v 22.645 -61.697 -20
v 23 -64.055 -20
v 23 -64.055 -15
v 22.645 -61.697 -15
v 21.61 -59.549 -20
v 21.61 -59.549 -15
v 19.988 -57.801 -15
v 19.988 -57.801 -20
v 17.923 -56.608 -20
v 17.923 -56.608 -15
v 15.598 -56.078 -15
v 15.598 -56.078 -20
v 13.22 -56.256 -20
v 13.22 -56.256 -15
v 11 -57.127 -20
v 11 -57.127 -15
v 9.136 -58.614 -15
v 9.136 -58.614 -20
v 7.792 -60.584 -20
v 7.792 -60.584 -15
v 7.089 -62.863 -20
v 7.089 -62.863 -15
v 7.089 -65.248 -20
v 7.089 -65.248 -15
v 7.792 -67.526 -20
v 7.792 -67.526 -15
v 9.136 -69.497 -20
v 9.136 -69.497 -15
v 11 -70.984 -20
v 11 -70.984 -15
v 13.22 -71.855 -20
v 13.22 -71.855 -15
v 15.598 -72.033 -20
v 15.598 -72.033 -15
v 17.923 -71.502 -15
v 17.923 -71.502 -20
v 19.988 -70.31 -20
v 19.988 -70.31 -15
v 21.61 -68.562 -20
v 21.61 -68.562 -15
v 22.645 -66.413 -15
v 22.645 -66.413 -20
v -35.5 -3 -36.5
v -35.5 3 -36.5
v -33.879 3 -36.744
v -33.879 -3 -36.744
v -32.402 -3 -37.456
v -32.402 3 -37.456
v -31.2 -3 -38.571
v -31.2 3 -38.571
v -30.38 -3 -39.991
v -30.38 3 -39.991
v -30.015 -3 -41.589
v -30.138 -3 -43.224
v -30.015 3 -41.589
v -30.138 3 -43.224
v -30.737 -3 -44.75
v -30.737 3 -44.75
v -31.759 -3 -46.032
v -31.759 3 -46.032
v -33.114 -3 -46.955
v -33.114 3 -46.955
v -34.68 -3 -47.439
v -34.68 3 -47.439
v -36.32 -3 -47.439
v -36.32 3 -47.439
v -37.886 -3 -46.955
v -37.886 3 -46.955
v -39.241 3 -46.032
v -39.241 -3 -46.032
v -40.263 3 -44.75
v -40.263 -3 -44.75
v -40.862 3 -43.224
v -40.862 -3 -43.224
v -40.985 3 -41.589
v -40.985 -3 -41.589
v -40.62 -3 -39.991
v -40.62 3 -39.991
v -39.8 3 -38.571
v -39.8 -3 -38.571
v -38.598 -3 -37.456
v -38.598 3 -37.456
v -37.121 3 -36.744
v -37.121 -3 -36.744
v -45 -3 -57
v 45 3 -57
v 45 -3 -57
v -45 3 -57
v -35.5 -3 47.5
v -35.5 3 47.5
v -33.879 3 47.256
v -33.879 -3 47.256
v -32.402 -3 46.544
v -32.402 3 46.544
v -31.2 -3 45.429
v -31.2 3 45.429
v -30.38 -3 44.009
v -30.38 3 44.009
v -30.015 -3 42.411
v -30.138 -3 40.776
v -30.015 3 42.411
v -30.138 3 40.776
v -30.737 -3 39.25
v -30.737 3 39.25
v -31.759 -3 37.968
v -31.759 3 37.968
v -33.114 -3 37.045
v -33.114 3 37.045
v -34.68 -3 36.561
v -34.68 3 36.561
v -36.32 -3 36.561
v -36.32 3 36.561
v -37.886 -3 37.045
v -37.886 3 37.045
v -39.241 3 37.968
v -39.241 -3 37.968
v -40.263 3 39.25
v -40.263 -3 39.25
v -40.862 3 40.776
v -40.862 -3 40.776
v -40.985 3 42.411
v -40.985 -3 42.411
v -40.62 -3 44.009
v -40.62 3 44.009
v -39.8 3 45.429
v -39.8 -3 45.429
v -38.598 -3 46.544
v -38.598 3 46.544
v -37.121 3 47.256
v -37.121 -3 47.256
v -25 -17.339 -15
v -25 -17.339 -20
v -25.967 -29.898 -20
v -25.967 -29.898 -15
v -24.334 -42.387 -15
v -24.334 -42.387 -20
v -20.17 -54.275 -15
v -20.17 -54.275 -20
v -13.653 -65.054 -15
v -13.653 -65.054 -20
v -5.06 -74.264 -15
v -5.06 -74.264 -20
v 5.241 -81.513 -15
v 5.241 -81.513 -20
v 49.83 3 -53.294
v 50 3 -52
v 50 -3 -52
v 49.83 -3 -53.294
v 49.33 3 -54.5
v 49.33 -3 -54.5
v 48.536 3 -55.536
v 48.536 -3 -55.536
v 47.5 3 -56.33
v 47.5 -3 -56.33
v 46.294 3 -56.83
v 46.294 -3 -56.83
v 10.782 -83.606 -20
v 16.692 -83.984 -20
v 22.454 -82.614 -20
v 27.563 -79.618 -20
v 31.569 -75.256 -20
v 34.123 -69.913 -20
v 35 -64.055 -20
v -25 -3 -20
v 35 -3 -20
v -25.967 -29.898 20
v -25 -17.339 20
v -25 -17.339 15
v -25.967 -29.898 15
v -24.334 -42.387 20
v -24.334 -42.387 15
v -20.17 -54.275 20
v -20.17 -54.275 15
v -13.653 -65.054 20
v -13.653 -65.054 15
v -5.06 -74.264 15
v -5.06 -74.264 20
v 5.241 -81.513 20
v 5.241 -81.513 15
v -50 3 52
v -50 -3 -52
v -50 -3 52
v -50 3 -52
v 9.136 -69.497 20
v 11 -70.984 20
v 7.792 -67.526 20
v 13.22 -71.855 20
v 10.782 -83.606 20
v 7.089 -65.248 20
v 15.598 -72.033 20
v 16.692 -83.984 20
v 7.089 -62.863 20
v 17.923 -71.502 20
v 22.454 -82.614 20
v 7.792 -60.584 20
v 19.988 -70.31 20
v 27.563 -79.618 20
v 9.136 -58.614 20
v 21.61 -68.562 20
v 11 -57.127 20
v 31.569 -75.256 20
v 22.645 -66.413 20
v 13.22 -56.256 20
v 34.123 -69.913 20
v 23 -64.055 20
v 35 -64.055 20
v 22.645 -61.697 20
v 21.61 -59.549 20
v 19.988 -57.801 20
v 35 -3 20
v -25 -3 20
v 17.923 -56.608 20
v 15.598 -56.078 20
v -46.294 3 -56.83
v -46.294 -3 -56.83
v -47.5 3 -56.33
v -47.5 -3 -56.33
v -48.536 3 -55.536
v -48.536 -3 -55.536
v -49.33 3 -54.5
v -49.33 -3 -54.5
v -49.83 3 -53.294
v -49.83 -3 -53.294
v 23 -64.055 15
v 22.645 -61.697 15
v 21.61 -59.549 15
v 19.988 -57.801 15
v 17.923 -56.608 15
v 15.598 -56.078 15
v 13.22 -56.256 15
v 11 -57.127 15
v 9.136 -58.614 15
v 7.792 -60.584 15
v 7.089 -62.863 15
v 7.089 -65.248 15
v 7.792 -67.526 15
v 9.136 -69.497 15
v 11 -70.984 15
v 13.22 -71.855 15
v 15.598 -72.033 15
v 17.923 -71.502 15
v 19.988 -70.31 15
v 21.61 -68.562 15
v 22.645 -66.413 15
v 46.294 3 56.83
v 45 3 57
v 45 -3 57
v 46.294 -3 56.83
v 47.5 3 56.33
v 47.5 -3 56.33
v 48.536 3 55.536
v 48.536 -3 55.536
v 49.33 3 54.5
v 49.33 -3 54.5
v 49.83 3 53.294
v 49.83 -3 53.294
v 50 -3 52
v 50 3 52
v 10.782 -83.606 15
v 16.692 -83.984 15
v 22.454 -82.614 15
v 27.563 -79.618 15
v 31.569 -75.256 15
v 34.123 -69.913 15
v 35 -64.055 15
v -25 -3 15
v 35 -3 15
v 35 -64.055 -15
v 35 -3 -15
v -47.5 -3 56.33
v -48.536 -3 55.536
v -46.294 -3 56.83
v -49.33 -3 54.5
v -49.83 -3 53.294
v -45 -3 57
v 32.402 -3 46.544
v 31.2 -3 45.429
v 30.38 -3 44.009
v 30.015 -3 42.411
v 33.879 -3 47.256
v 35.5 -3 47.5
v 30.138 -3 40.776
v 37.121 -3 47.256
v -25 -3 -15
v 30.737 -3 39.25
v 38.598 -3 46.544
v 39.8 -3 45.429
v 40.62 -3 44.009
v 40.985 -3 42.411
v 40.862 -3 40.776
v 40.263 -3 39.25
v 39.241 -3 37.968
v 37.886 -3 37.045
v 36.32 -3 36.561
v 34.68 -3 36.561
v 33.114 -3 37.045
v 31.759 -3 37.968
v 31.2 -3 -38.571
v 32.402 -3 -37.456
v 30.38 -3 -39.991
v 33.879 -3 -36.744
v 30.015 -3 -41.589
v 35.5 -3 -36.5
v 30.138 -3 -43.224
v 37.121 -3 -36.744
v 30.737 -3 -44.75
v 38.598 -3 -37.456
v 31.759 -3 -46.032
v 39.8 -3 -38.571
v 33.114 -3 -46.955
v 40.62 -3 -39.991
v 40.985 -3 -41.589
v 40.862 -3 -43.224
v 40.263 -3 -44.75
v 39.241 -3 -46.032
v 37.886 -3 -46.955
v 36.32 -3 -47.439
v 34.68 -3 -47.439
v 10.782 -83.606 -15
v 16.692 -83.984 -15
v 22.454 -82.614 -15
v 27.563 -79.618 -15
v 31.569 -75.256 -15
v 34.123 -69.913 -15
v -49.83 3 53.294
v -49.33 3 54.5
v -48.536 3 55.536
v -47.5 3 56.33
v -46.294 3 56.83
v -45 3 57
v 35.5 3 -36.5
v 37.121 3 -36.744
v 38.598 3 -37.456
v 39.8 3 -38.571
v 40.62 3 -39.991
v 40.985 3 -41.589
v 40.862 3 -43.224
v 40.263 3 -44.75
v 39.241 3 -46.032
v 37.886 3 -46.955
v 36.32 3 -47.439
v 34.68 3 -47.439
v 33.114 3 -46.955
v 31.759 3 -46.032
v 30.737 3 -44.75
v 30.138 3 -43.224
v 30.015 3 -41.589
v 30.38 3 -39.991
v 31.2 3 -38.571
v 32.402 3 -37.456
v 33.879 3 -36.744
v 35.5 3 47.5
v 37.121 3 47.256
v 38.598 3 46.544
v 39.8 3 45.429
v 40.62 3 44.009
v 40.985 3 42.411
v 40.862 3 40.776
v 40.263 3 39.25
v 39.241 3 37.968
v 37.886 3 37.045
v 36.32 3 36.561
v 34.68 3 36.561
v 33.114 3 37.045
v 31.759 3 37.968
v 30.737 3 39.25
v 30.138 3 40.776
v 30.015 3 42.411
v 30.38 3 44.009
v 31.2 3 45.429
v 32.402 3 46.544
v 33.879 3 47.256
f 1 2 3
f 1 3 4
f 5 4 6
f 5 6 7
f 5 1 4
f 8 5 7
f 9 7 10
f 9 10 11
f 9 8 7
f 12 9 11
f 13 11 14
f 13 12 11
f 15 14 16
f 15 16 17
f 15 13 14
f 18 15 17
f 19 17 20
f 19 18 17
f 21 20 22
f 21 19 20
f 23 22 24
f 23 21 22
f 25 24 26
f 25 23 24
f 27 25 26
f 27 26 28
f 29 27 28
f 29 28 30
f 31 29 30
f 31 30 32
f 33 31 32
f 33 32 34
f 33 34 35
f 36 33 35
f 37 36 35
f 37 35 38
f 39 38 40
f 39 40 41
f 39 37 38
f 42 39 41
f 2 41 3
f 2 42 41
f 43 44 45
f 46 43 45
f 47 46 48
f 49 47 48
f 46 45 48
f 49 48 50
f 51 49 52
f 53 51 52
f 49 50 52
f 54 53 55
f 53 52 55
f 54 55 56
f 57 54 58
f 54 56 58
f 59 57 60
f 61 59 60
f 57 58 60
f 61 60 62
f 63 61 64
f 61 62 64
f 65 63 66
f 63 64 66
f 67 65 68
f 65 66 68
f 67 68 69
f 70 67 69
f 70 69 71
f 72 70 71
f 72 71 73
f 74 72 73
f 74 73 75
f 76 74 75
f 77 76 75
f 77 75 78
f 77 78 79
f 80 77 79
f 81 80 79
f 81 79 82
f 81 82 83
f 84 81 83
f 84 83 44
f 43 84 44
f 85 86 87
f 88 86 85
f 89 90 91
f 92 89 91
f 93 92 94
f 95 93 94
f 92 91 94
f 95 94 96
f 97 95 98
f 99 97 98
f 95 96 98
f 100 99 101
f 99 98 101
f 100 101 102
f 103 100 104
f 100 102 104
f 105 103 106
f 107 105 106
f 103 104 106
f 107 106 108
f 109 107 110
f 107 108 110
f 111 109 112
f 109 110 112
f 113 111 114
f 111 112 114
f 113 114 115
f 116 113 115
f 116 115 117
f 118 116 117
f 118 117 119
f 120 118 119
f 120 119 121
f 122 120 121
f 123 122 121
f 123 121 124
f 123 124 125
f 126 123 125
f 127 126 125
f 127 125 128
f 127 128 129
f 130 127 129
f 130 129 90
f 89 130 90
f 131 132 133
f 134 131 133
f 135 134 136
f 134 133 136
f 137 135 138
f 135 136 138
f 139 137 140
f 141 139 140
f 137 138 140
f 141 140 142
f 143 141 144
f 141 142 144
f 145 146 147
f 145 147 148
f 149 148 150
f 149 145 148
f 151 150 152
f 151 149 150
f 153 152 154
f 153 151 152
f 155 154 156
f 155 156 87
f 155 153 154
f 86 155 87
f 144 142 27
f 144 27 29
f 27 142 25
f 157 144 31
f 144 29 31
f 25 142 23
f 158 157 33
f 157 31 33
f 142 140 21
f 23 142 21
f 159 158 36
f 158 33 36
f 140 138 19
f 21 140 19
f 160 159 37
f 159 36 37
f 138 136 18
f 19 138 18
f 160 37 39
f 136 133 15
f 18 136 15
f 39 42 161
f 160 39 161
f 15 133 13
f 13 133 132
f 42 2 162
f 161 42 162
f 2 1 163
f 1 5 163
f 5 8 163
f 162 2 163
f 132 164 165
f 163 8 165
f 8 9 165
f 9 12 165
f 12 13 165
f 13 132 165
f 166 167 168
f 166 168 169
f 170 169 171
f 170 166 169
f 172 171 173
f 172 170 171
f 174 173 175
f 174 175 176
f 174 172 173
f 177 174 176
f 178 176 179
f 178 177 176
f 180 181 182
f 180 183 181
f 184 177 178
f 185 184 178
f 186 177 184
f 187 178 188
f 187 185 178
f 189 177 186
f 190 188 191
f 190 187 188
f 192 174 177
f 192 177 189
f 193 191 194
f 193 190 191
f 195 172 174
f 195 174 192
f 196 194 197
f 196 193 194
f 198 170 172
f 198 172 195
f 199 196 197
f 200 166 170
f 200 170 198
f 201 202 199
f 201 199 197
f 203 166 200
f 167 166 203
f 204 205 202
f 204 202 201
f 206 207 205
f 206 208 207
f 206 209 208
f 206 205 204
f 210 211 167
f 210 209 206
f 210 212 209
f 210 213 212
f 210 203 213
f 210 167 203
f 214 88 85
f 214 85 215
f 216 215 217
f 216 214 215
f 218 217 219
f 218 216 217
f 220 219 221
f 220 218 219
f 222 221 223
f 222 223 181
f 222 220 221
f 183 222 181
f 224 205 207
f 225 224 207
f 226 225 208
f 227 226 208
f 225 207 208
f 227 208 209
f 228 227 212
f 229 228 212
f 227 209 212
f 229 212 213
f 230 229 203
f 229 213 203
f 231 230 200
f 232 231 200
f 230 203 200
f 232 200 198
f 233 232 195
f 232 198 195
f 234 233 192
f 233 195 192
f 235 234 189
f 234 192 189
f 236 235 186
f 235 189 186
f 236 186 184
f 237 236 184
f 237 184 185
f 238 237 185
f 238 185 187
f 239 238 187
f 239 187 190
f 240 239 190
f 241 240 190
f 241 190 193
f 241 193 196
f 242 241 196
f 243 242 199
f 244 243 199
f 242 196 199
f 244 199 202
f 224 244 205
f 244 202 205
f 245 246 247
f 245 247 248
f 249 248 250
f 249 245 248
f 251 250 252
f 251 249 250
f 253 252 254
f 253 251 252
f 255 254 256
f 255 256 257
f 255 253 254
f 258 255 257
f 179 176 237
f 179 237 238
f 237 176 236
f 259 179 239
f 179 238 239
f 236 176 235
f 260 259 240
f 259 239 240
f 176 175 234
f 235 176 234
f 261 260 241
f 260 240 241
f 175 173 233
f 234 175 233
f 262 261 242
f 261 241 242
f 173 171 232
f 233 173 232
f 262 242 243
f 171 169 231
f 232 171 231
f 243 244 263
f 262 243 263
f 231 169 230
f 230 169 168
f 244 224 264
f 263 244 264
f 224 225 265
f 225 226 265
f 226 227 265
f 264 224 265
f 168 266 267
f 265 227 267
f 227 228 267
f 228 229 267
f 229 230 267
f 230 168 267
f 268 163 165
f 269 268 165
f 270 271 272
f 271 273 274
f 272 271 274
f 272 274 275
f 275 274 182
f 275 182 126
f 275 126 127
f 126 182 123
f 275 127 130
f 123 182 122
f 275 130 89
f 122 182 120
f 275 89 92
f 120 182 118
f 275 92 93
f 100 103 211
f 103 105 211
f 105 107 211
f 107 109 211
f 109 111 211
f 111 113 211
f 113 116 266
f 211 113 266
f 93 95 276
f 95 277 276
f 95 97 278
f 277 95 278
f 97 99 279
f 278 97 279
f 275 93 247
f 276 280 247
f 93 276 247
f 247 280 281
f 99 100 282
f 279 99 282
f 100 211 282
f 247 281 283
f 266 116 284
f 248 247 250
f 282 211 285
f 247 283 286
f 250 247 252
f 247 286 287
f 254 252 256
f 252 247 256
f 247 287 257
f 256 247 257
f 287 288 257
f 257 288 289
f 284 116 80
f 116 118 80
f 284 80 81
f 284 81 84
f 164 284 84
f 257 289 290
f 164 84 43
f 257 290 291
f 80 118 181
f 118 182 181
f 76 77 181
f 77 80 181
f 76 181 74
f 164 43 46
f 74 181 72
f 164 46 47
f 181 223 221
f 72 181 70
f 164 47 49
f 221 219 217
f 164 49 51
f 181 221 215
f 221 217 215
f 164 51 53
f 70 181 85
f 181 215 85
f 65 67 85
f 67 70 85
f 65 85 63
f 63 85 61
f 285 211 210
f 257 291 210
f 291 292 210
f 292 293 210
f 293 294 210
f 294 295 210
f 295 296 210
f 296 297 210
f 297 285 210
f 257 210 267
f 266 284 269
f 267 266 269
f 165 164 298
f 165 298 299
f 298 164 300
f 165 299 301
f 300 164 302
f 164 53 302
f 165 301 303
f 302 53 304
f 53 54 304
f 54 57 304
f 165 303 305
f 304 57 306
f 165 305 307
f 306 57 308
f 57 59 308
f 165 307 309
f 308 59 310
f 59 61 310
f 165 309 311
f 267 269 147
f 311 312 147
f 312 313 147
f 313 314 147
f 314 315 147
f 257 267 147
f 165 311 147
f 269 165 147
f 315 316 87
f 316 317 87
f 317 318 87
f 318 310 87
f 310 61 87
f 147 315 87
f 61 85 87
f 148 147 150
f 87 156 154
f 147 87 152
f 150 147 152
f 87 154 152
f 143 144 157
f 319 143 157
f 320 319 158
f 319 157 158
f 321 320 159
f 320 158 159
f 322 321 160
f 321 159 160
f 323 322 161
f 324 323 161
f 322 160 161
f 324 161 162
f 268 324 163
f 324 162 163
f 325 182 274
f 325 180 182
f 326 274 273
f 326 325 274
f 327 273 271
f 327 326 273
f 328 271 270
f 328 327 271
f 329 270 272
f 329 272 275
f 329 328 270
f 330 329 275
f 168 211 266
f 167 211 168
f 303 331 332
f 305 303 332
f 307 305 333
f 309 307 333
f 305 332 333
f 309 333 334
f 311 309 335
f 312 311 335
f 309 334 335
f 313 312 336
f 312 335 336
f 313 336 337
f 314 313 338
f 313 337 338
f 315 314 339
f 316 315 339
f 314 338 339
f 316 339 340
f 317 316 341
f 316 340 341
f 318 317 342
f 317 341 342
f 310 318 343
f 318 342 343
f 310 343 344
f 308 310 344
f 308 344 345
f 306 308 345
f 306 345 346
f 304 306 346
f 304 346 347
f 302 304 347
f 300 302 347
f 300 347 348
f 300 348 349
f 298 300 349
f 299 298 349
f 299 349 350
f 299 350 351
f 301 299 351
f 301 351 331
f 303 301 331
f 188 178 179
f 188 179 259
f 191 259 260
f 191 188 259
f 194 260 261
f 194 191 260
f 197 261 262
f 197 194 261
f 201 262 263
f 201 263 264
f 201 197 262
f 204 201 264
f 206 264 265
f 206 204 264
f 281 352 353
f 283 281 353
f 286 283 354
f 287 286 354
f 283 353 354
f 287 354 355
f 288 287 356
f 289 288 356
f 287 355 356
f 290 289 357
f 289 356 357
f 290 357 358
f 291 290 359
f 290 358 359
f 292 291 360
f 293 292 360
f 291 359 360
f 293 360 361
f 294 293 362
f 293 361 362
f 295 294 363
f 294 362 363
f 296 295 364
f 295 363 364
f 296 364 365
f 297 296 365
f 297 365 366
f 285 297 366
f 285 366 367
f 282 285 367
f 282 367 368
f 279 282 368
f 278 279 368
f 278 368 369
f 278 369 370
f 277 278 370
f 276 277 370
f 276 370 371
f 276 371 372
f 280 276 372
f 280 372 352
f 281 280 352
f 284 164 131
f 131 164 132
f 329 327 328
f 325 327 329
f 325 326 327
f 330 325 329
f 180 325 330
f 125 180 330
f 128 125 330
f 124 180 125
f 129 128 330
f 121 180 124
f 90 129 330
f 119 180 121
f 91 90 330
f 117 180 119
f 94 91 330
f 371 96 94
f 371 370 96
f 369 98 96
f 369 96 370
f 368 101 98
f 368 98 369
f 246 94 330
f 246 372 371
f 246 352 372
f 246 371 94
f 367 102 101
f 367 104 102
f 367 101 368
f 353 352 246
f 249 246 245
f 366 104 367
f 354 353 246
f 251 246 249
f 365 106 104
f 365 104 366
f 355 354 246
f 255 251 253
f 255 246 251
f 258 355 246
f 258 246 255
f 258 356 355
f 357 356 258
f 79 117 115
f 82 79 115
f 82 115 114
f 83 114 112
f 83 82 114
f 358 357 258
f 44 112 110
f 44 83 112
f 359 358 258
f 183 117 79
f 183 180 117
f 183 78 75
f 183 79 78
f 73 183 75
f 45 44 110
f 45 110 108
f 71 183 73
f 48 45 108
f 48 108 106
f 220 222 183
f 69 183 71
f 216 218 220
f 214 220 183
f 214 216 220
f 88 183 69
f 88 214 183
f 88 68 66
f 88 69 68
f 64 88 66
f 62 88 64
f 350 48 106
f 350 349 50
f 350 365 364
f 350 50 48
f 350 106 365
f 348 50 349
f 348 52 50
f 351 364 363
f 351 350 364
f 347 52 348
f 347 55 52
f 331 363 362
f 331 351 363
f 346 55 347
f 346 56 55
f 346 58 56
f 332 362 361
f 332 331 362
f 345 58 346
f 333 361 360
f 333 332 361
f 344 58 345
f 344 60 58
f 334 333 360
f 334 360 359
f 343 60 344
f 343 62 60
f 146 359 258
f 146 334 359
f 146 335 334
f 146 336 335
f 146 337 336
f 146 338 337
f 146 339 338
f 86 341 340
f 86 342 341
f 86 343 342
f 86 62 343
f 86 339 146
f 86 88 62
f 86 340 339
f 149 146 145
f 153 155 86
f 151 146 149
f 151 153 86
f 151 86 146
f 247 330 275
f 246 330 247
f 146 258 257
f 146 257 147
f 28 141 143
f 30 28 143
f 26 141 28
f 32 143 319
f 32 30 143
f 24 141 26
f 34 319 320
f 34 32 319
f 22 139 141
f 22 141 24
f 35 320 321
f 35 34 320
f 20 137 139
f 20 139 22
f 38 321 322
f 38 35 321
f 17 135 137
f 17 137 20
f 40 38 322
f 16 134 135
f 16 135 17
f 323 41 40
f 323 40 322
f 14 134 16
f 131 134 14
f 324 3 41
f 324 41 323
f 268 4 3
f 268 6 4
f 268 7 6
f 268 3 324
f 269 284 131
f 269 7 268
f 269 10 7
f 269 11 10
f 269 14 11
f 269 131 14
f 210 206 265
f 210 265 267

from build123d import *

# Parameters (mm, degrees)
BOSS_EXTRUDE1_DEPTH = 3
BOSS_EXTRUDE2_START = 20
SKETCH2_R           = 8
BOSS_EXTRUDE2_DEPTH = 5
SKETCH3_R           = 5.5
CUT_EXTRUDE1_DEPTH  = 116.445427837


with BuildPart() as part:
    # Sketch1 → Boss-Extrude1 (new, symmetric)
    with BuildSketch(Plane(origin=(0, 0, 0), x_dir=(1, 0, 0), z_dir=(0, 1, 0))):
        with BuildLine():
            Line((-45, -57), (45, -57))
            ThreePointArc((45, -57), (48.535533906, -55.535533906), (50, -52))
            Line((50, -52), (50, 52))
            ThreePointArc((50, 52), (48.535533906, 55.535533906), (45, 57))
            Line((45, 57), (-45, 57))
            ThreePointArc((-45, 57), (-48.535533906, 55.535533906), (-50, 52))
            Line((-50, 52), (-50, -52))
            ThreePointArc((-50, -52), (-48.535533906, -55.535533906), (-45, -57))
        make_face()
    extrude(amount=BOSS_EXTRUDE1_DEPTH, both=True)

    # Sketch2 → Boss-Extrude2 (add)
    with BuildSketch(Plane.XY.offset(BOSS_EXTRUDE2_START)):
        with BuildLine():
            Line((-25, -3), (-25, -17.338880751))
            ThreePointArc((-25, -17.338880751), (-20.170076441, -54.275307328), (5.241257633, -81.512999419))
            ThreePointArc((5.241257633, -81.512999419), (25.119909898, -81.306146184), (35, -64.055423774))
            Line((35, -64.055423774), (35, -3))
            Line((35, -3), (-25, -3))
        make_face()
        with Locations((15, -64.055423774)):
            Circle(SKETCH2_R, mode=Mode.SUBTRACT)
    boss_extrude2 = extrude(amount=-BOSS_EXTRUDE2_DEPTH)

    # Mirror1: Boss-Extrude2 across plane
    add(boss_extrude2.mirror(Plane.XY))

    # Sketch3 → Cut-Extrude1 (cut, through all)
    with BuildSketch(Plane(origin=(0, 3, 0), x_dir=(1, 0, 0), z_dir=(0, 1, 0))):
        with Locations(Location((35.5, 42, 0), (0, 0, 270))):
            Circle(SKETCH3_R)
        with Locations(Location((-35.5, 42, 0), (0, 0, 270))):
            Circle(SKETCH3_R)
        with Locations(Location((-35.5, -42, 0), (0, 0, 270))):
            Circle(SKETCH3_R)
        with Locations(Location((35.5, -42, 0), (0, 0, 270))):
            Circle(SKETCH3_R)
    extrude(amount=-CUT_EXTRUDE1_DEPTH, mode=Mode.SUBTRACT)


solid = part.part
